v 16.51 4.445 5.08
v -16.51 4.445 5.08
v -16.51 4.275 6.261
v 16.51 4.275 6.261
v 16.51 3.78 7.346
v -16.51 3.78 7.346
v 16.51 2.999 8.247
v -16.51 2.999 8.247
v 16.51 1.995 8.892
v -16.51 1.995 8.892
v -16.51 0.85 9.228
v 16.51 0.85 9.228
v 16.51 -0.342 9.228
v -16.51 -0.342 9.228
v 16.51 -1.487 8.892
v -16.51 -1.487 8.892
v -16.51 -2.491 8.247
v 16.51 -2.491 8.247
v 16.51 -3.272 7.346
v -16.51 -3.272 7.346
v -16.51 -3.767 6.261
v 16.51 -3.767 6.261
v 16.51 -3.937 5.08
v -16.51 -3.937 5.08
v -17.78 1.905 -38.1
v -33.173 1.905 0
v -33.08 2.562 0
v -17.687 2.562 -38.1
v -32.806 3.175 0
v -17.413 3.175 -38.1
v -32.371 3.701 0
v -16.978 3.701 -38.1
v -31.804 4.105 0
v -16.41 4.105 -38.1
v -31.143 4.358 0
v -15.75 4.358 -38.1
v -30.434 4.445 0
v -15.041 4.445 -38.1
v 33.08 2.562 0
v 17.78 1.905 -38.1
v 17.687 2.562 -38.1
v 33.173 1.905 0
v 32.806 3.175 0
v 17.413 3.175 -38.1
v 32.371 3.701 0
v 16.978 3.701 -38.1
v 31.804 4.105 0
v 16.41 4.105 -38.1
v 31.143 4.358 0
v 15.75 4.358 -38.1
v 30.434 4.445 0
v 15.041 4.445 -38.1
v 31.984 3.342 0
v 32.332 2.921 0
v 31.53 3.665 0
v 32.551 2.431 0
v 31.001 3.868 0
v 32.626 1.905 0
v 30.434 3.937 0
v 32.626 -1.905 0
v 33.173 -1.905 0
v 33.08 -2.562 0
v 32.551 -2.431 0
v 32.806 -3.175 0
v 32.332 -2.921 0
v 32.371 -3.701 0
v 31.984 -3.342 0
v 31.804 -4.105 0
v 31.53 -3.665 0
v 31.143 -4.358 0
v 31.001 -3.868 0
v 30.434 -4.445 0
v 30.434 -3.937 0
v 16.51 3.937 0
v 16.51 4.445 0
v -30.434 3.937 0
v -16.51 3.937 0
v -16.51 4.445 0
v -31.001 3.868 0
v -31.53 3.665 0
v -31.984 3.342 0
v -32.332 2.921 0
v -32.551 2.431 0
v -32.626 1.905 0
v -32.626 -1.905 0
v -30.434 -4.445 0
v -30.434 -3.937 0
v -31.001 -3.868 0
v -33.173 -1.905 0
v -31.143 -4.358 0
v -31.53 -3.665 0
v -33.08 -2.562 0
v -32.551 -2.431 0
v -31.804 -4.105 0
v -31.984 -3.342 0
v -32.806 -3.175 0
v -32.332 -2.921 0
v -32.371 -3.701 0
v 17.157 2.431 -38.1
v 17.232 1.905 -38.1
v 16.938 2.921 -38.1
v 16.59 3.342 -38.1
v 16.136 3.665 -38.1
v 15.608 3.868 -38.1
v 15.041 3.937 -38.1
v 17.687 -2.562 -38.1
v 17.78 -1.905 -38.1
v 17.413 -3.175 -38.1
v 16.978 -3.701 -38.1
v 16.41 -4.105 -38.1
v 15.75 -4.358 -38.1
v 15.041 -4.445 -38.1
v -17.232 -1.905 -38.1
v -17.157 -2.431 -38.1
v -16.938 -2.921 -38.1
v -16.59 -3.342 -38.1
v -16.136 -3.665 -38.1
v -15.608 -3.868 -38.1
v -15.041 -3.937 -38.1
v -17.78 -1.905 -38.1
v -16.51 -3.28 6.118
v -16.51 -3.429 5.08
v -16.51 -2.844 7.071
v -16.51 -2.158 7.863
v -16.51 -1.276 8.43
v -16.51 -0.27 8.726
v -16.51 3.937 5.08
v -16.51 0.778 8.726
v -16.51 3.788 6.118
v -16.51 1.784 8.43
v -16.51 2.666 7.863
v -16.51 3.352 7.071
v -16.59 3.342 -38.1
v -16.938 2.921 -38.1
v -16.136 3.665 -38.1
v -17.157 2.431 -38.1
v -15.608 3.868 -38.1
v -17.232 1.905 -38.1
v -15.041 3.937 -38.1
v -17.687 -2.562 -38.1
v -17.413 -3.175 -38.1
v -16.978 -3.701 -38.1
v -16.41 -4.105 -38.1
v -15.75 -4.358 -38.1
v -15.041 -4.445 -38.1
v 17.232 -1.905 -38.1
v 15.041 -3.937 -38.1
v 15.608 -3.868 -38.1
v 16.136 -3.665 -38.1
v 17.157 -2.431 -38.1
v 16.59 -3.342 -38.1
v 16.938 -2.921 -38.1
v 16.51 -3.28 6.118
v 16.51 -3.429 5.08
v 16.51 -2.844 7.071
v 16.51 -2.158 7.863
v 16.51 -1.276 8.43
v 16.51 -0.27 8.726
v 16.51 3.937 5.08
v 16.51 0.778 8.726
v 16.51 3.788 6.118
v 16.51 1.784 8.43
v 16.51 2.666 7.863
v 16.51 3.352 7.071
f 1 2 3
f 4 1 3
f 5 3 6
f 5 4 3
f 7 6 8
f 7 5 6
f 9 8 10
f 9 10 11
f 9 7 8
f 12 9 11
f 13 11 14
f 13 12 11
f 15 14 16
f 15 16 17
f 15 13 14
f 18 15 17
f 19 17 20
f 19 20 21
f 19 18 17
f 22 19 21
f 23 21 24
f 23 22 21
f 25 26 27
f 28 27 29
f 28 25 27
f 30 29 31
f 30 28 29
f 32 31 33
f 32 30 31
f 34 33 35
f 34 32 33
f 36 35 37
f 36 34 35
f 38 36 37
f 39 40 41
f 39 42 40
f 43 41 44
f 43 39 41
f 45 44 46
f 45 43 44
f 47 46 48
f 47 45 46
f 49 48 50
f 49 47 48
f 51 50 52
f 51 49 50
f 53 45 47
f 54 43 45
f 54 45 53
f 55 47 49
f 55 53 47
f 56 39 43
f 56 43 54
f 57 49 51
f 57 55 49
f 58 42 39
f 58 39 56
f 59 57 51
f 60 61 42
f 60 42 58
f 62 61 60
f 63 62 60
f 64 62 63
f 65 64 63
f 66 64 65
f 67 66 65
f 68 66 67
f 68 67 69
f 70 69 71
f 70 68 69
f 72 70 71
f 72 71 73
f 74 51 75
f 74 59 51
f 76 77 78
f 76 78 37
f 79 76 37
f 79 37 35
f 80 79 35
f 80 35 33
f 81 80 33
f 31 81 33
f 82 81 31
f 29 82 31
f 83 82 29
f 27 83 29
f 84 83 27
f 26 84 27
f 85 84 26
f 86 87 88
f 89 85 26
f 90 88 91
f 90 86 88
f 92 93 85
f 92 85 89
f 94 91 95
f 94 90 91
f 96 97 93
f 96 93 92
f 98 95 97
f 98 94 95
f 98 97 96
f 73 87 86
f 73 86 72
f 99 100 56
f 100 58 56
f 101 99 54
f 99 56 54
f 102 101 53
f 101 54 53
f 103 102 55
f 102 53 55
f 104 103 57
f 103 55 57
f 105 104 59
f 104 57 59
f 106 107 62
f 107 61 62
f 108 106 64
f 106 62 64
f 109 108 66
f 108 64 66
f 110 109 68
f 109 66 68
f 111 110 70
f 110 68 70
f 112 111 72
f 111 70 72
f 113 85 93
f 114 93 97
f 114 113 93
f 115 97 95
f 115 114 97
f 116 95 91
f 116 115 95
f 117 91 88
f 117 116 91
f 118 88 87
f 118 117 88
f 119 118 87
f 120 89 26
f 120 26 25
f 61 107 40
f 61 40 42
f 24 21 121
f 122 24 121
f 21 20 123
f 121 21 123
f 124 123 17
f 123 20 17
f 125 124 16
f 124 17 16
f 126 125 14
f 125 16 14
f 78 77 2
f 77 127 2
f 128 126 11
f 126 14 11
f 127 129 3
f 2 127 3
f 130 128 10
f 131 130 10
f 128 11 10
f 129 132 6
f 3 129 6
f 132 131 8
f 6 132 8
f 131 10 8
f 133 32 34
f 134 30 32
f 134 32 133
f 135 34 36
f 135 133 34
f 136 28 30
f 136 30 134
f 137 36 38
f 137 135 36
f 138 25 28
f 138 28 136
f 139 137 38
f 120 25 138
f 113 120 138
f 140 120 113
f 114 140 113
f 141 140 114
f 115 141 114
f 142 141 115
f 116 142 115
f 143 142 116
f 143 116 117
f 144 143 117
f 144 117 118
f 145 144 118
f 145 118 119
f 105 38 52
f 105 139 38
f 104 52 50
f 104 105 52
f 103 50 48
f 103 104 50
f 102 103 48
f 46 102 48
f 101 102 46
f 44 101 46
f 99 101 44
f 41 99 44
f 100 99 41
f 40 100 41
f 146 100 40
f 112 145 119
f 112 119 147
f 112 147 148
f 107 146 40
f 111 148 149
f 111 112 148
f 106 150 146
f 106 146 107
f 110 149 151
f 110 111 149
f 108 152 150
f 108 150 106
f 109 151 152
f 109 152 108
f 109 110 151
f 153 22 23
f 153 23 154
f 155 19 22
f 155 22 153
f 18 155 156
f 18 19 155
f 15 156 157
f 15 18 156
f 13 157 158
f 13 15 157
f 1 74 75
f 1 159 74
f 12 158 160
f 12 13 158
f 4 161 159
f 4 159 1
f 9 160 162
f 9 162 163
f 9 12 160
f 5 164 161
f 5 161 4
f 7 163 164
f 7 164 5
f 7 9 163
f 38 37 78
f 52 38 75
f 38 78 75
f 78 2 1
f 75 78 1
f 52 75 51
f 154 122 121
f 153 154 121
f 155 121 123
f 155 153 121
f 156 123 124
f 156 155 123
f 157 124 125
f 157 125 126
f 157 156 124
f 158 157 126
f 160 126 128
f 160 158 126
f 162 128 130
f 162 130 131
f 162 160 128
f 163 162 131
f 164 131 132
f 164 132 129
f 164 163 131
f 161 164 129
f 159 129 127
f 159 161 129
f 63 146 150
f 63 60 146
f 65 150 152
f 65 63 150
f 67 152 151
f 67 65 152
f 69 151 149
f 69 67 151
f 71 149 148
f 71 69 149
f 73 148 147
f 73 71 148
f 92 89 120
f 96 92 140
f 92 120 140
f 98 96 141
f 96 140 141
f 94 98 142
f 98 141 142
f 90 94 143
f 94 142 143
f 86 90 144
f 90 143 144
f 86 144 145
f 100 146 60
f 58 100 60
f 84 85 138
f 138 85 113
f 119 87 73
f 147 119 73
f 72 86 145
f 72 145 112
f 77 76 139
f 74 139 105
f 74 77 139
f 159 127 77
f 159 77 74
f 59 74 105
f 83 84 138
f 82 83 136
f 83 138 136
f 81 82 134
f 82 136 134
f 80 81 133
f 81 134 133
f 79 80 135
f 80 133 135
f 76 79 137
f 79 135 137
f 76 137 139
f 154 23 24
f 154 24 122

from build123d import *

# Parameters (mm, degrees)
F1_DEPTH = 4.445
F2_R     = 2.54
F3_T     = -0.508
F6_DEPTH = 16.51


with BuildPart() as f1:
    # F0 (on Front) → F1 (new body, symmetric)
    with BuildSketch(Plane.XZ):
        Polygon((17.78, -38.1), (33.173399, 0), (-33.173399, 0), (-17.78, -38.1), align=None)
    extrude(amount=F1_DEPTH, both=True)

    # F2
    f2_edges = [f1.edges().sort_by_distance(p)[0] for p in [
        (25.4767, 4.445, -19.05),
        (25.4767, -4.445, -19.05),
        (-25.4767, 4.445, -19.05),
        (-25.4767, -4.445, -19.05),
    ]]
    fillet(f2_edges, radius=F2_R)

    # F3
    f3_openings = [f1.faces().sort_by_distance(p)[0] for p in [
        (0, 0, 0),
        (0, 0, -38.1),
    ]]
    offset(amount=F3_T, openings=f3_openings)

    # F5 (on Right) → F6 (join, symmetric)
    with BuildSketch(Plane.YZ):
        with BuildLine():
            Line((3.937, 0), (4.445, 0))
            Line((4.445, 0), (4.445, 5.08))
            ThreePointArc((4.445, 5.08), (0.254, 9.271), (-3.937, 5.08))
            Line((-3.937, 5.08), (-3.429, 5.08))
            ThreePointArc((-3.429, 5.08), (0.254, 8.763), (3.937, 5.08))
            Line((3.937, 5.08), (3.937, 0))
        make_face()
    extrude(amount=F6_DEPTH, both=True)


solid = f1.part
